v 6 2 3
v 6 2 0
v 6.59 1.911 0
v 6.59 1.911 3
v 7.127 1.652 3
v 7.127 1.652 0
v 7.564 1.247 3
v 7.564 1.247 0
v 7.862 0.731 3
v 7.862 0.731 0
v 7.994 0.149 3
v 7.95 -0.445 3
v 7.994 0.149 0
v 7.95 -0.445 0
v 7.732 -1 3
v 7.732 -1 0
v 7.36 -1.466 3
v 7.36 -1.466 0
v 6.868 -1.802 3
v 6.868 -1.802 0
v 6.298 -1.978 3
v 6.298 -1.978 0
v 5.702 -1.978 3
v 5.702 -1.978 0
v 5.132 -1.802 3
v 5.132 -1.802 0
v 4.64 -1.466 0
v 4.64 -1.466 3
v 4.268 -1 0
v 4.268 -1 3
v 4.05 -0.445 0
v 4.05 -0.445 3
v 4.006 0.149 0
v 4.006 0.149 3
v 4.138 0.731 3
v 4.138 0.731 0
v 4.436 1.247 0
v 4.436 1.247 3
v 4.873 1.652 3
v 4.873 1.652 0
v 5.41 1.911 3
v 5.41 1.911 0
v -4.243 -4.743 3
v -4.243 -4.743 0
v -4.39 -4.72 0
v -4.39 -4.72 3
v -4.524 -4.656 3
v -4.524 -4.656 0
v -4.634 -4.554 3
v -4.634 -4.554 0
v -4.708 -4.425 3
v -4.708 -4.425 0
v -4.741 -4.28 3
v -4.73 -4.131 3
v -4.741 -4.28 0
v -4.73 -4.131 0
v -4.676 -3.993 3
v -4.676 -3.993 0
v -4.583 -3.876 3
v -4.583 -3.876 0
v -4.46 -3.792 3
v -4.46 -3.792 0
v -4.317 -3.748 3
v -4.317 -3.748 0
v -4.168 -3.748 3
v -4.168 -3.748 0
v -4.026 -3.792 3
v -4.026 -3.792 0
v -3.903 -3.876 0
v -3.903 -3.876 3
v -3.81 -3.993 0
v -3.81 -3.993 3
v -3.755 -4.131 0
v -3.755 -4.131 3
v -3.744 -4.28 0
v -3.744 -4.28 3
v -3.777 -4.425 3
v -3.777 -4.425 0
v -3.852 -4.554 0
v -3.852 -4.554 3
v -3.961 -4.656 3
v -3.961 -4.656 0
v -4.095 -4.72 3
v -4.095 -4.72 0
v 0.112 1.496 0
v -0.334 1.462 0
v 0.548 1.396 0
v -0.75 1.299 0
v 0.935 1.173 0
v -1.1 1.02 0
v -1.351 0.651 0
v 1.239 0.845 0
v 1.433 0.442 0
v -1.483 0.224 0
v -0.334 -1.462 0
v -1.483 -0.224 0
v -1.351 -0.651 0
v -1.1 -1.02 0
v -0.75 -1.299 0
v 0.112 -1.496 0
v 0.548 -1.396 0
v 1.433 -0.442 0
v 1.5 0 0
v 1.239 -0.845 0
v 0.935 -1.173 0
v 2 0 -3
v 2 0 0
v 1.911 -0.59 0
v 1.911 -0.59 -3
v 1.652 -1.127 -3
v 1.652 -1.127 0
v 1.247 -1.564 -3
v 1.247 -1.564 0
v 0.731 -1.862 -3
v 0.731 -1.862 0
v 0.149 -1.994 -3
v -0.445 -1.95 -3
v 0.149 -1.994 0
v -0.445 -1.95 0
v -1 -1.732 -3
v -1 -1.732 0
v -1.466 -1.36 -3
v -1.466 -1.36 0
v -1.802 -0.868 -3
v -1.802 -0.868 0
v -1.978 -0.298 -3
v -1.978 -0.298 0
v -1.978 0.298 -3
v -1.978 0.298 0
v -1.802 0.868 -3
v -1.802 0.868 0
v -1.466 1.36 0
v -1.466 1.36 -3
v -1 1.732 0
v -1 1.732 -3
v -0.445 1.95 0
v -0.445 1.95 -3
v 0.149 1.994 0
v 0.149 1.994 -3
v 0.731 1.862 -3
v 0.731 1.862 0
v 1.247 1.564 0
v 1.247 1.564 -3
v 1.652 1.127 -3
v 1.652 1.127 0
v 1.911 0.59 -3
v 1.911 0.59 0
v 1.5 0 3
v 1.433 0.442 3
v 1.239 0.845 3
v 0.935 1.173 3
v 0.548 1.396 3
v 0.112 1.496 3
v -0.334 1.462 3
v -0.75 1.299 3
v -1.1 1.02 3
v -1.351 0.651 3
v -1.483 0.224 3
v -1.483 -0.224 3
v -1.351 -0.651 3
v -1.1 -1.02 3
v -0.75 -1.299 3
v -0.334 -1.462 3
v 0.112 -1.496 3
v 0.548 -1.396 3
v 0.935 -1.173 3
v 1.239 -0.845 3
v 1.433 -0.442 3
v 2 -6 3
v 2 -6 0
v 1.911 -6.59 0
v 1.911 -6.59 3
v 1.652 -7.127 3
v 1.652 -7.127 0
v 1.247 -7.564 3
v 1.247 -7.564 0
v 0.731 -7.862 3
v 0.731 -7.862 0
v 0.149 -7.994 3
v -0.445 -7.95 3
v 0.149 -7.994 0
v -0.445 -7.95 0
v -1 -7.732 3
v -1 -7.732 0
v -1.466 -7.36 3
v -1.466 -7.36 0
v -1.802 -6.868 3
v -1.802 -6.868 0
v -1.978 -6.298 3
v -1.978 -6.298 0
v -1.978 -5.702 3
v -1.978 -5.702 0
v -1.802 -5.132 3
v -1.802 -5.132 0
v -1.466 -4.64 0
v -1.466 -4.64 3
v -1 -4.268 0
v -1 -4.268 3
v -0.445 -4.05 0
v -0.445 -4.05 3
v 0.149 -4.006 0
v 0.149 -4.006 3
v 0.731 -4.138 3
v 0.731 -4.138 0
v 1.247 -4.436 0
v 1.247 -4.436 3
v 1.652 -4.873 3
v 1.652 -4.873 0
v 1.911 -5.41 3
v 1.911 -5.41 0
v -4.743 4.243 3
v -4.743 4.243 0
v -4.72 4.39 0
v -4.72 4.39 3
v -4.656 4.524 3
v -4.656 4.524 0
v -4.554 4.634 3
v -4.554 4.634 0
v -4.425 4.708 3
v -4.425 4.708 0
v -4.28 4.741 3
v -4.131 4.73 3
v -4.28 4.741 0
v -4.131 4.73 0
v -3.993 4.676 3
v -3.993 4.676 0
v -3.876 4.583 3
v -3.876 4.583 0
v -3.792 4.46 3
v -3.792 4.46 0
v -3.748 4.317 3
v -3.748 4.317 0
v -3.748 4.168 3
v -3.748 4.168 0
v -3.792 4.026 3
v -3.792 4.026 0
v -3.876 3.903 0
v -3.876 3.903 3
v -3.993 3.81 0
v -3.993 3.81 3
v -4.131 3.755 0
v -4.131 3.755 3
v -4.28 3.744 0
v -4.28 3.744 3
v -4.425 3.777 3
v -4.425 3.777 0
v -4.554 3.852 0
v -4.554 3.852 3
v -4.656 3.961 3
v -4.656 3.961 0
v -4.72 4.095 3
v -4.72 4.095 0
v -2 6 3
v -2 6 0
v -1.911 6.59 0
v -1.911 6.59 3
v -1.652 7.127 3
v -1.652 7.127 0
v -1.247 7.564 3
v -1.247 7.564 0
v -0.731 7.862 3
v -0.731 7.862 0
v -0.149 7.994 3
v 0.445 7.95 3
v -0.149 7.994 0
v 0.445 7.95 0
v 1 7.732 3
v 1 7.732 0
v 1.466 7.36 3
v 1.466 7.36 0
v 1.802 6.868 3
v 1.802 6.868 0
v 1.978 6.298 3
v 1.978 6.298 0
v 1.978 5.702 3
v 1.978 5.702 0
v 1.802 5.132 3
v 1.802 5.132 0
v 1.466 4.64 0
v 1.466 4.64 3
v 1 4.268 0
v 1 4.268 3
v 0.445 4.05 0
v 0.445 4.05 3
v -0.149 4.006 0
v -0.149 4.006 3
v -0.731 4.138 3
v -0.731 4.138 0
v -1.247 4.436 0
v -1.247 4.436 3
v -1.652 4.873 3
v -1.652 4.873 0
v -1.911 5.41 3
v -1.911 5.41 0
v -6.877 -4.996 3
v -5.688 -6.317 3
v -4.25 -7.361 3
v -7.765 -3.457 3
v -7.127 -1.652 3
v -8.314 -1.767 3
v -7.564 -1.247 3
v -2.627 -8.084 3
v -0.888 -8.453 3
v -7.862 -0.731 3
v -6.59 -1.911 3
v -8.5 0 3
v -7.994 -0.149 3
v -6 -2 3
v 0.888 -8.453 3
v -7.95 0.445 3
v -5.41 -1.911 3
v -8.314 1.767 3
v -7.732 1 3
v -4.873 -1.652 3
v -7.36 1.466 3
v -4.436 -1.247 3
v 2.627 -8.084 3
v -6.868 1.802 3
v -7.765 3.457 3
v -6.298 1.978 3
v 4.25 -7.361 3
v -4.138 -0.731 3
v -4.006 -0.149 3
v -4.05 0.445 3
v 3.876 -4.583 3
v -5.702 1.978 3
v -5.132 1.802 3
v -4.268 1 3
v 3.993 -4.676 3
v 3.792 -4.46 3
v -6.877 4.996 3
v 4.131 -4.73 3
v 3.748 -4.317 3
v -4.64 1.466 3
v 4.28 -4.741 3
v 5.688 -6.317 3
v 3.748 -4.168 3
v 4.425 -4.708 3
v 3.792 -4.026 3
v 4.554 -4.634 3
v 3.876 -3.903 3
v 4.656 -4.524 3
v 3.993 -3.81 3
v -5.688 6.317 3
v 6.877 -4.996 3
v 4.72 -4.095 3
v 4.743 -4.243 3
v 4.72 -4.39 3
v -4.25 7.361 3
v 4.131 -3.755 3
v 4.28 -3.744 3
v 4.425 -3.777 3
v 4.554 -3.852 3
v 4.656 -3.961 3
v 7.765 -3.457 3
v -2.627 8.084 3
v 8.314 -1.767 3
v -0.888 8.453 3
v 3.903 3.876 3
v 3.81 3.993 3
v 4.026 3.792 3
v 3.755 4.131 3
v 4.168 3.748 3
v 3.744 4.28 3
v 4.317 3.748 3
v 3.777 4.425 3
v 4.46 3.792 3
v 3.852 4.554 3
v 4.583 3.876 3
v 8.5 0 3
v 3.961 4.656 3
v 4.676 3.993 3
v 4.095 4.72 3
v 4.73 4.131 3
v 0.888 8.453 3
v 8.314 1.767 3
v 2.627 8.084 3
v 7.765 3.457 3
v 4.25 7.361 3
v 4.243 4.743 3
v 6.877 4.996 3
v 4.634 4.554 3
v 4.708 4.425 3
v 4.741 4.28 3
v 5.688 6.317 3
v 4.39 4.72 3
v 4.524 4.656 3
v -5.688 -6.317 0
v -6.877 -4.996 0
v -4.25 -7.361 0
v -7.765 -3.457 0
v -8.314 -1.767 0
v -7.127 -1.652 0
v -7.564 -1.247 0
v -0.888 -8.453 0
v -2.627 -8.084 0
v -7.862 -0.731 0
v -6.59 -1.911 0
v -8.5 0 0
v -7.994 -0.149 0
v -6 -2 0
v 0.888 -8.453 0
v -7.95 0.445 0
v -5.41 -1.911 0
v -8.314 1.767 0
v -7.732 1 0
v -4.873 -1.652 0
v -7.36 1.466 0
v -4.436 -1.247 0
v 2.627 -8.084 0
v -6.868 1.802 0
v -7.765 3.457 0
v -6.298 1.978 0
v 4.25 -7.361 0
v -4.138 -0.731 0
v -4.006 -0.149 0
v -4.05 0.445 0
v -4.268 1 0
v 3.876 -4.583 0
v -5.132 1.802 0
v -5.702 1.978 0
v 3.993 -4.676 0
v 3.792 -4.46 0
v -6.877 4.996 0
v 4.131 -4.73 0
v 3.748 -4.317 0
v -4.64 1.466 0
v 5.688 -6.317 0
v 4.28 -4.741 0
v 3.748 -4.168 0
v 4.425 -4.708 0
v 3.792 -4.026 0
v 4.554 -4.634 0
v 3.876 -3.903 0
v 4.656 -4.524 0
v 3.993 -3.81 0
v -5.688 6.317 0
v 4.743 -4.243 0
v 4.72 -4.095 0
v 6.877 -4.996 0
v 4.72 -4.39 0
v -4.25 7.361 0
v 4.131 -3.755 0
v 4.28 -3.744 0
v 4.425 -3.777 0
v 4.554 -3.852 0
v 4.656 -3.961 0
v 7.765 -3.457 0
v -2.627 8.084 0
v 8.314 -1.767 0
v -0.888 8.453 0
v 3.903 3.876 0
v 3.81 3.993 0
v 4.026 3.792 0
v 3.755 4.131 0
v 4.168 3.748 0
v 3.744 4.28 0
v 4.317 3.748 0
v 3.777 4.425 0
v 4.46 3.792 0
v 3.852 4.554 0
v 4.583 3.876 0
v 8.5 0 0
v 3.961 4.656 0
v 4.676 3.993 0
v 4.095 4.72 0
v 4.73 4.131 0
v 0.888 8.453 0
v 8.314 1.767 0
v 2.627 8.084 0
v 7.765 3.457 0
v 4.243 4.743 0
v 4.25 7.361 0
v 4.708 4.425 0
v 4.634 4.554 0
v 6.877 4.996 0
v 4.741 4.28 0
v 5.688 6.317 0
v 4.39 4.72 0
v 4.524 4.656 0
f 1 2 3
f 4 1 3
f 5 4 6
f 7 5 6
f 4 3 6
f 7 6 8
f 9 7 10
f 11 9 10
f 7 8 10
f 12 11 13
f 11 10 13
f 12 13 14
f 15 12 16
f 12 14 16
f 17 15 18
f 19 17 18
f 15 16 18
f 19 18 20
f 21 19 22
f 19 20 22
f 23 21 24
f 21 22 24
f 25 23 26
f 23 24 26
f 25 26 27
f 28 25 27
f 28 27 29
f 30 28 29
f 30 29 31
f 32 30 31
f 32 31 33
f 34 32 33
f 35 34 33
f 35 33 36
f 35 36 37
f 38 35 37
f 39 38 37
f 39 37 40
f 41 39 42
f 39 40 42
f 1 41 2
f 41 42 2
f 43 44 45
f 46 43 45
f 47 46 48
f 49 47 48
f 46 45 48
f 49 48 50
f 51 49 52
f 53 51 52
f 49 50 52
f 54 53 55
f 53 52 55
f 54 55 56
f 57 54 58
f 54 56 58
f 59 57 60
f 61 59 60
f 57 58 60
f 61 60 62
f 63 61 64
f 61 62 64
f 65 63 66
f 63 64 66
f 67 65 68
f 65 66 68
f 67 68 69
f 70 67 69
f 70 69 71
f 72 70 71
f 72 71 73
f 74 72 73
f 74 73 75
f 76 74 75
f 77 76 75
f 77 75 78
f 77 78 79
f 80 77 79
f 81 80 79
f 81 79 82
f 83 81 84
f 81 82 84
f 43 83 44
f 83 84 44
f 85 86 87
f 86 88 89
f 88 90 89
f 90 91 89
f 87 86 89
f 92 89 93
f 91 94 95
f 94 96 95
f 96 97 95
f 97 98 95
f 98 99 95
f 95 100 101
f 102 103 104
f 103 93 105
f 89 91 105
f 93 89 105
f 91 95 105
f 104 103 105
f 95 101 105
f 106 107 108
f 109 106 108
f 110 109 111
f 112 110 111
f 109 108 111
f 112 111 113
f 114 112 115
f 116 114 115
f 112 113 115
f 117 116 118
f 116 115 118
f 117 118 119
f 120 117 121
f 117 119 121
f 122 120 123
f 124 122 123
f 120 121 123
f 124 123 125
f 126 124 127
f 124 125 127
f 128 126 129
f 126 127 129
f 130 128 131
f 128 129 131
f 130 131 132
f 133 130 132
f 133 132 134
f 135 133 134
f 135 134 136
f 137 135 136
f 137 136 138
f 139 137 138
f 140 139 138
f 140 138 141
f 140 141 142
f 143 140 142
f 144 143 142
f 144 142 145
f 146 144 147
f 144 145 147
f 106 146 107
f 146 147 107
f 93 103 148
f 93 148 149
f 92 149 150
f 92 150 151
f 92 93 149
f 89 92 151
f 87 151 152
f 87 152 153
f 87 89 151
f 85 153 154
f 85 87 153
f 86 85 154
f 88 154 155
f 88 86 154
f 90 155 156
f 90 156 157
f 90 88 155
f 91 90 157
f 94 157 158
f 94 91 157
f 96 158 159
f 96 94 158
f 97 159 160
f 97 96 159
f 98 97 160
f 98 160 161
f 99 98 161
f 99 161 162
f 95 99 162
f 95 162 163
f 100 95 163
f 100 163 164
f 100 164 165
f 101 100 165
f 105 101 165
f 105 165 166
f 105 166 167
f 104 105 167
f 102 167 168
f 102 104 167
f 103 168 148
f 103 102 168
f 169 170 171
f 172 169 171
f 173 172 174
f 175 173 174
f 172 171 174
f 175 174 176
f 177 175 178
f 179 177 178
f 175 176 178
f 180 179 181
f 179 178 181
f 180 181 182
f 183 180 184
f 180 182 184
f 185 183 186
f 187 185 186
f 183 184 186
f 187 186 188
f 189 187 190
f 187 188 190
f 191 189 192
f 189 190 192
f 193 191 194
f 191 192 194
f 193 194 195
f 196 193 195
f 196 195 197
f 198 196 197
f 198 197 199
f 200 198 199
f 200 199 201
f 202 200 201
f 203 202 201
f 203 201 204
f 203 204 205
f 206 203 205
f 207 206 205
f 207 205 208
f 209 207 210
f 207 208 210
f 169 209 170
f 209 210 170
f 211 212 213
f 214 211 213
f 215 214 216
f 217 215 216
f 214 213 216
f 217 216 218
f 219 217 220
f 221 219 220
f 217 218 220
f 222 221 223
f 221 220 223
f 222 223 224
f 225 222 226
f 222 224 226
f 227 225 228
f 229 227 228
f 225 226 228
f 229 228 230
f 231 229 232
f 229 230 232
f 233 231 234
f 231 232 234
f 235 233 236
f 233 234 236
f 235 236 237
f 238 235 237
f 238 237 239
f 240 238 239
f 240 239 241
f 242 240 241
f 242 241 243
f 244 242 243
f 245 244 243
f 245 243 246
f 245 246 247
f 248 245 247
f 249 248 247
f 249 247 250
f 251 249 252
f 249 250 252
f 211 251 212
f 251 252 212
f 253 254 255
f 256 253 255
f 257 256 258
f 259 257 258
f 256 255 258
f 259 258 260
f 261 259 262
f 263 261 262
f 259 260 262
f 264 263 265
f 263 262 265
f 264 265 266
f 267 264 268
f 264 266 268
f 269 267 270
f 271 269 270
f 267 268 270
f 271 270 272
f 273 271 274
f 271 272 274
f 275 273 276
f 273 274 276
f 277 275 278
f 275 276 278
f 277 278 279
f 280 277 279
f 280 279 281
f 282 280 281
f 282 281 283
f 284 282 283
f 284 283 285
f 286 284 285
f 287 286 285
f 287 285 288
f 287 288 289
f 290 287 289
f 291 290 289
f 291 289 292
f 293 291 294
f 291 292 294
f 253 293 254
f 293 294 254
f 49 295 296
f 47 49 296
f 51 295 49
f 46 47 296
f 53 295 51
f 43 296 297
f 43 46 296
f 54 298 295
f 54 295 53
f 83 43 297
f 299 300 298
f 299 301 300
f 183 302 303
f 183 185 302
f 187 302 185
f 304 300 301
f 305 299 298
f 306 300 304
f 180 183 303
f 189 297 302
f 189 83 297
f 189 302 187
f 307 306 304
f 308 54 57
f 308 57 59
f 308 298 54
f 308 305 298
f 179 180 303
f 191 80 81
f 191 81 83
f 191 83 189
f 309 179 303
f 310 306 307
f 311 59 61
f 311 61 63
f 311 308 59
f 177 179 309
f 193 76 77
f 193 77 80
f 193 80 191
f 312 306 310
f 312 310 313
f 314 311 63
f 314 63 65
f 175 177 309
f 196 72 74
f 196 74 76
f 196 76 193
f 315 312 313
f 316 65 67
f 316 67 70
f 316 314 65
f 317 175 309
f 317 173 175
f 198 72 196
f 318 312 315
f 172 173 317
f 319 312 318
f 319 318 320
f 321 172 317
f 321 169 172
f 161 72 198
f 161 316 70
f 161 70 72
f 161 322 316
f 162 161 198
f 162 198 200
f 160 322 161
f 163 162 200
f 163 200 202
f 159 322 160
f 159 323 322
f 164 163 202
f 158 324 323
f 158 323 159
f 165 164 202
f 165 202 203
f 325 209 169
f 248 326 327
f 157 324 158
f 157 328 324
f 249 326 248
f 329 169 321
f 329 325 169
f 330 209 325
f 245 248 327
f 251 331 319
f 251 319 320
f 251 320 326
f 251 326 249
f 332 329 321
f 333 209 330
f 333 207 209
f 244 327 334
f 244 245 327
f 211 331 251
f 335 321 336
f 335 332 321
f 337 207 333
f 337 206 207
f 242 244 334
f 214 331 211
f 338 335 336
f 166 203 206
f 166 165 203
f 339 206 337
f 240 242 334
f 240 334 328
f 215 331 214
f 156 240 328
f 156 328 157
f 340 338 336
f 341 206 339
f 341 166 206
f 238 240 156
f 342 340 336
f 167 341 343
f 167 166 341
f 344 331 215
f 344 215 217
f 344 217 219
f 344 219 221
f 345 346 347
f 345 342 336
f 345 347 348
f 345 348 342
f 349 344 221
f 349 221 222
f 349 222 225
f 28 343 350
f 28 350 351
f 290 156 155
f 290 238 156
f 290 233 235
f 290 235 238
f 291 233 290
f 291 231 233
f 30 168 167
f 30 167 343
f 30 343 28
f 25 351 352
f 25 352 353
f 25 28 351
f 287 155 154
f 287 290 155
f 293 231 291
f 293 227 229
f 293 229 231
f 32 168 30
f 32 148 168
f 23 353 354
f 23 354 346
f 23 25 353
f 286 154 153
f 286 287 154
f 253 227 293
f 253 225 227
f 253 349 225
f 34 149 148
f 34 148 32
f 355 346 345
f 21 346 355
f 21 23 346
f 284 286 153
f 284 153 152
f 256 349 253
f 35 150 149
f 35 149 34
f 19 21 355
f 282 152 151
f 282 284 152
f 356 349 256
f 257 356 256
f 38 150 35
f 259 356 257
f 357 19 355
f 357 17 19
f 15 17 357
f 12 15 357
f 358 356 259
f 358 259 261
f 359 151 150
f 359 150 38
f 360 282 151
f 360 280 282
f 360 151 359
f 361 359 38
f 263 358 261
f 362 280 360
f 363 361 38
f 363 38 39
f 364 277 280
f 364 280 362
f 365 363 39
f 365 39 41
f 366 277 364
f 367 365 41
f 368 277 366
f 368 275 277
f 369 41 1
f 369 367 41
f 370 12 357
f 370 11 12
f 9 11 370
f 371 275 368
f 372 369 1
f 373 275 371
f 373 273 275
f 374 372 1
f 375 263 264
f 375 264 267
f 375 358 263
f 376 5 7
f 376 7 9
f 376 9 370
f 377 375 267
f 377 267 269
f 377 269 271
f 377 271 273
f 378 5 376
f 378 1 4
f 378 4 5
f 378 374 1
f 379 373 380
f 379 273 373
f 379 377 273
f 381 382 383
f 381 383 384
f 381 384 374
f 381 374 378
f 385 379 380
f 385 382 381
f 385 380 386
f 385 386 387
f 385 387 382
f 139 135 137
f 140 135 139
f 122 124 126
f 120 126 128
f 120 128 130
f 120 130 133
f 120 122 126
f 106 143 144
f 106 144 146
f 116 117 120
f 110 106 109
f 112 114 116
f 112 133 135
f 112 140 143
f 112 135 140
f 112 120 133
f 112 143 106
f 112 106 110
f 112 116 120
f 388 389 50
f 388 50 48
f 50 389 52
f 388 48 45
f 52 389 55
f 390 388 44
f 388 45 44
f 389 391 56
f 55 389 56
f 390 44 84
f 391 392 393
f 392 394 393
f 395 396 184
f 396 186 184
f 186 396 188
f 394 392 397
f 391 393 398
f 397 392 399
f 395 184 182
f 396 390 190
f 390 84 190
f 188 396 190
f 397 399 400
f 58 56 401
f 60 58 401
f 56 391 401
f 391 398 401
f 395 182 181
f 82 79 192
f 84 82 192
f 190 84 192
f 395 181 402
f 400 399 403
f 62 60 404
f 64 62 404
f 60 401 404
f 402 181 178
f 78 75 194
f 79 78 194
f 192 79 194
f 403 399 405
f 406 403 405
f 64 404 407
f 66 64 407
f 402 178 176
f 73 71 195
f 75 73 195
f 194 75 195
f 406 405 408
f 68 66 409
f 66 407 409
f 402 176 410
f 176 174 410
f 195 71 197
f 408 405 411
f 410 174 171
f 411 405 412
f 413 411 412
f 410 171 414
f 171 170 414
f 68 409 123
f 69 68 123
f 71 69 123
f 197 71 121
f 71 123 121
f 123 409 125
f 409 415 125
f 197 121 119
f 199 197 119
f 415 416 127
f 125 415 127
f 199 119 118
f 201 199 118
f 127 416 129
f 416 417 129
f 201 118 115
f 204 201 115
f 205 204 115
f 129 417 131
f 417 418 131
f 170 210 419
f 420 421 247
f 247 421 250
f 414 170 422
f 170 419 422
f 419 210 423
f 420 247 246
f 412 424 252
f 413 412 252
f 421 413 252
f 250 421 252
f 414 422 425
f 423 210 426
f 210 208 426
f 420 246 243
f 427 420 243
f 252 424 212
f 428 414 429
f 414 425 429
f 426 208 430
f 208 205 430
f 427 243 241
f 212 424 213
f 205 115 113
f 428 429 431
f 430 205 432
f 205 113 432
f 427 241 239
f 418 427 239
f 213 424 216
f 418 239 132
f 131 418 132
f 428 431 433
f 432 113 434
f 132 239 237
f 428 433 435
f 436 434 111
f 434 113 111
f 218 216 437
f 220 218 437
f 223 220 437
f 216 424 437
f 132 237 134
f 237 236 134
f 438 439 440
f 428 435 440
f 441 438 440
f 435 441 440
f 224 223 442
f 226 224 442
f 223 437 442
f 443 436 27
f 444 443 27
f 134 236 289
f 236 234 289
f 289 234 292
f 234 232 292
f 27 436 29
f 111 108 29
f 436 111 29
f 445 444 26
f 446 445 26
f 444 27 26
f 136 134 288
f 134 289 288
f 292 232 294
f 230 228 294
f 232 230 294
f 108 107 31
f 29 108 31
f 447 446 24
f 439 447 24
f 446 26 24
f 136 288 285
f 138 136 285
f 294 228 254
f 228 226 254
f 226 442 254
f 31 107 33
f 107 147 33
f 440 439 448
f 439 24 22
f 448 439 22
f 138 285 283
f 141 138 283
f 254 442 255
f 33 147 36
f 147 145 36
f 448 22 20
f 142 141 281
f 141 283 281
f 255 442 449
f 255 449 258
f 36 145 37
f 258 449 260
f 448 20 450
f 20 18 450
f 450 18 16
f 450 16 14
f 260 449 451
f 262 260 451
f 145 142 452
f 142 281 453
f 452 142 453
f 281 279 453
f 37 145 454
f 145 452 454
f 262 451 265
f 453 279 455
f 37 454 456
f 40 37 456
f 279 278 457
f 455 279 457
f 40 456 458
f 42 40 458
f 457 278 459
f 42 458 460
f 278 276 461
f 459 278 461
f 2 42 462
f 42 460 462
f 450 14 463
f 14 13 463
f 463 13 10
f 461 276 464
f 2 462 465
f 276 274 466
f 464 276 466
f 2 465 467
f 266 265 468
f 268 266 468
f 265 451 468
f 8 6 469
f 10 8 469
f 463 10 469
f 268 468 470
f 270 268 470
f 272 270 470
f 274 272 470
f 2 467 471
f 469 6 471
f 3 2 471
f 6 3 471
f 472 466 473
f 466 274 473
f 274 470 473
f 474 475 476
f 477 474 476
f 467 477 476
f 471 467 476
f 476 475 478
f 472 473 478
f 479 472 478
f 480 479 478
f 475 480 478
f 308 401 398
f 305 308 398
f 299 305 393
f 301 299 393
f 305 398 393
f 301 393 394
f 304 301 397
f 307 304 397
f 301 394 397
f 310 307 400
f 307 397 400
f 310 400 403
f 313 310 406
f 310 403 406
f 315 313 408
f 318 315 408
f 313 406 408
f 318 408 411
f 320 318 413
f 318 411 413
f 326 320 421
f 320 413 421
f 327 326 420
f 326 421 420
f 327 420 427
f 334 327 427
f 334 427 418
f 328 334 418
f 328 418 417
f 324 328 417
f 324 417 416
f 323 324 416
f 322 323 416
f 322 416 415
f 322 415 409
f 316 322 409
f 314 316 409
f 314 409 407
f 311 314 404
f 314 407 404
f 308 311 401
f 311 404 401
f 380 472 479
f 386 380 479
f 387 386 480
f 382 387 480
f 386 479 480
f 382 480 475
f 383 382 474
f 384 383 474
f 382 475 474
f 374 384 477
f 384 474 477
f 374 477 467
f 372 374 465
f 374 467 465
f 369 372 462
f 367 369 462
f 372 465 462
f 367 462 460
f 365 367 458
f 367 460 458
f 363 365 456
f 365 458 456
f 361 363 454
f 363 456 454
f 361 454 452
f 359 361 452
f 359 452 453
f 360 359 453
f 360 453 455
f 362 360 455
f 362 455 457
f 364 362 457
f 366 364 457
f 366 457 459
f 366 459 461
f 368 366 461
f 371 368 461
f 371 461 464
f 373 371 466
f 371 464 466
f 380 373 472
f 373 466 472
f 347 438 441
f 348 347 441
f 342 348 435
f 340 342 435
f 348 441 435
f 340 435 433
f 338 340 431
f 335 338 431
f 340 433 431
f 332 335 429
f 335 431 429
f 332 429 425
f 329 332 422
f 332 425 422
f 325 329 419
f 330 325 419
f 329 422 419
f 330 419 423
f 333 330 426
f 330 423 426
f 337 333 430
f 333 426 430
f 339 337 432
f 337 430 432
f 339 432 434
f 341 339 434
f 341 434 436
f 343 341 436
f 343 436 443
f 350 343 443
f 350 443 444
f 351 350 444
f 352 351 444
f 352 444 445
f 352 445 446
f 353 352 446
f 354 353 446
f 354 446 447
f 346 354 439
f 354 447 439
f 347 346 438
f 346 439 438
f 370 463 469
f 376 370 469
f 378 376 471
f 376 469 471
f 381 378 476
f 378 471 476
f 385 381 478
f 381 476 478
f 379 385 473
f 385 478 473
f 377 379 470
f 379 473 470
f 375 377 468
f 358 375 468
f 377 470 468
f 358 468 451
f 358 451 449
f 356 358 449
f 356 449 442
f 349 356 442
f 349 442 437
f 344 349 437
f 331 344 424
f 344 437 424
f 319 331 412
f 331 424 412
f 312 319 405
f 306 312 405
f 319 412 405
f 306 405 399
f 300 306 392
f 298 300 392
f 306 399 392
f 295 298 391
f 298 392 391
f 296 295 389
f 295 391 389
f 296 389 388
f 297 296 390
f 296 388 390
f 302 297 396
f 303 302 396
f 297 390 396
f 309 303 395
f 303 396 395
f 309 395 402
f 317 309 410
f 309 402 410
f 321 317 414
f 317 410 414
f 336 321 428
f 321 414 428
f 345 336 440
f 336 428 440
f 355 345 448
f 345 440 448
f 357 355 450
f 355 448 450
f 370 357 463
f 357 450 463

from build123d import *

# Parameters (mm, degrees)
SKETCH_R           = 8.5
SKETCH_R_2         = 1.5
PAD_DEPTH          = 3
SKETCH001_R        = 2
SKETCH001_R_2      = 0.5
POCKET_DEPTH       = 3
POLARPATTERN_COUNT = 4
SKETCH002_R        = 2
PAD001_DEPTH       = 3


with BuildPart() as part:
    # Sketch → Pad (new body)
    with BuildSketch(Plane.XY):
        Circle(SKETCH_R)
        Circle(SKETCH_R_2, mode=Mode.SUBTRACT)
    extrude(amount=PAD_DEPTH)

    # Sketch001 → Pocket (cut)
    with BuildSketch(Plane(origin=(0, 0, 0), x_dir=(1, 0, 0), z_dir=(0, 0, -1))):
        with Locations((0, 6)):
            Circle(SKETCH001_R)
        with Locations((4.24264, 4.24264)):
            Circle(SKETCH001_R_2)
    pocket = extrude(amount=-POCKET_DEPTH, mode=Mode.SUBTRACT)

    # PolarPattern: Pocket ×4 about axis
    polarpattern_axis = Axis((0, 0, 0), (0, 0, -1))
    for i in range(1, POLARPATTERN_COUNT):
        add(pocket.rotate(polarpattern_axis, i * 360 / POLARPATTERN_COUNT), mode=Mode.SUBTRACT)

    # Sketch002 → Pad001 (new body)
    with BuildSketch(Plane(origin=(0, 0, 0), x_dir=(1, 0, 0), z_dir=(0, 0, -1))):
        Circle(SKETCH002_R)
    extrude(amount=PAD001_DEPTH)


solid = part.part
